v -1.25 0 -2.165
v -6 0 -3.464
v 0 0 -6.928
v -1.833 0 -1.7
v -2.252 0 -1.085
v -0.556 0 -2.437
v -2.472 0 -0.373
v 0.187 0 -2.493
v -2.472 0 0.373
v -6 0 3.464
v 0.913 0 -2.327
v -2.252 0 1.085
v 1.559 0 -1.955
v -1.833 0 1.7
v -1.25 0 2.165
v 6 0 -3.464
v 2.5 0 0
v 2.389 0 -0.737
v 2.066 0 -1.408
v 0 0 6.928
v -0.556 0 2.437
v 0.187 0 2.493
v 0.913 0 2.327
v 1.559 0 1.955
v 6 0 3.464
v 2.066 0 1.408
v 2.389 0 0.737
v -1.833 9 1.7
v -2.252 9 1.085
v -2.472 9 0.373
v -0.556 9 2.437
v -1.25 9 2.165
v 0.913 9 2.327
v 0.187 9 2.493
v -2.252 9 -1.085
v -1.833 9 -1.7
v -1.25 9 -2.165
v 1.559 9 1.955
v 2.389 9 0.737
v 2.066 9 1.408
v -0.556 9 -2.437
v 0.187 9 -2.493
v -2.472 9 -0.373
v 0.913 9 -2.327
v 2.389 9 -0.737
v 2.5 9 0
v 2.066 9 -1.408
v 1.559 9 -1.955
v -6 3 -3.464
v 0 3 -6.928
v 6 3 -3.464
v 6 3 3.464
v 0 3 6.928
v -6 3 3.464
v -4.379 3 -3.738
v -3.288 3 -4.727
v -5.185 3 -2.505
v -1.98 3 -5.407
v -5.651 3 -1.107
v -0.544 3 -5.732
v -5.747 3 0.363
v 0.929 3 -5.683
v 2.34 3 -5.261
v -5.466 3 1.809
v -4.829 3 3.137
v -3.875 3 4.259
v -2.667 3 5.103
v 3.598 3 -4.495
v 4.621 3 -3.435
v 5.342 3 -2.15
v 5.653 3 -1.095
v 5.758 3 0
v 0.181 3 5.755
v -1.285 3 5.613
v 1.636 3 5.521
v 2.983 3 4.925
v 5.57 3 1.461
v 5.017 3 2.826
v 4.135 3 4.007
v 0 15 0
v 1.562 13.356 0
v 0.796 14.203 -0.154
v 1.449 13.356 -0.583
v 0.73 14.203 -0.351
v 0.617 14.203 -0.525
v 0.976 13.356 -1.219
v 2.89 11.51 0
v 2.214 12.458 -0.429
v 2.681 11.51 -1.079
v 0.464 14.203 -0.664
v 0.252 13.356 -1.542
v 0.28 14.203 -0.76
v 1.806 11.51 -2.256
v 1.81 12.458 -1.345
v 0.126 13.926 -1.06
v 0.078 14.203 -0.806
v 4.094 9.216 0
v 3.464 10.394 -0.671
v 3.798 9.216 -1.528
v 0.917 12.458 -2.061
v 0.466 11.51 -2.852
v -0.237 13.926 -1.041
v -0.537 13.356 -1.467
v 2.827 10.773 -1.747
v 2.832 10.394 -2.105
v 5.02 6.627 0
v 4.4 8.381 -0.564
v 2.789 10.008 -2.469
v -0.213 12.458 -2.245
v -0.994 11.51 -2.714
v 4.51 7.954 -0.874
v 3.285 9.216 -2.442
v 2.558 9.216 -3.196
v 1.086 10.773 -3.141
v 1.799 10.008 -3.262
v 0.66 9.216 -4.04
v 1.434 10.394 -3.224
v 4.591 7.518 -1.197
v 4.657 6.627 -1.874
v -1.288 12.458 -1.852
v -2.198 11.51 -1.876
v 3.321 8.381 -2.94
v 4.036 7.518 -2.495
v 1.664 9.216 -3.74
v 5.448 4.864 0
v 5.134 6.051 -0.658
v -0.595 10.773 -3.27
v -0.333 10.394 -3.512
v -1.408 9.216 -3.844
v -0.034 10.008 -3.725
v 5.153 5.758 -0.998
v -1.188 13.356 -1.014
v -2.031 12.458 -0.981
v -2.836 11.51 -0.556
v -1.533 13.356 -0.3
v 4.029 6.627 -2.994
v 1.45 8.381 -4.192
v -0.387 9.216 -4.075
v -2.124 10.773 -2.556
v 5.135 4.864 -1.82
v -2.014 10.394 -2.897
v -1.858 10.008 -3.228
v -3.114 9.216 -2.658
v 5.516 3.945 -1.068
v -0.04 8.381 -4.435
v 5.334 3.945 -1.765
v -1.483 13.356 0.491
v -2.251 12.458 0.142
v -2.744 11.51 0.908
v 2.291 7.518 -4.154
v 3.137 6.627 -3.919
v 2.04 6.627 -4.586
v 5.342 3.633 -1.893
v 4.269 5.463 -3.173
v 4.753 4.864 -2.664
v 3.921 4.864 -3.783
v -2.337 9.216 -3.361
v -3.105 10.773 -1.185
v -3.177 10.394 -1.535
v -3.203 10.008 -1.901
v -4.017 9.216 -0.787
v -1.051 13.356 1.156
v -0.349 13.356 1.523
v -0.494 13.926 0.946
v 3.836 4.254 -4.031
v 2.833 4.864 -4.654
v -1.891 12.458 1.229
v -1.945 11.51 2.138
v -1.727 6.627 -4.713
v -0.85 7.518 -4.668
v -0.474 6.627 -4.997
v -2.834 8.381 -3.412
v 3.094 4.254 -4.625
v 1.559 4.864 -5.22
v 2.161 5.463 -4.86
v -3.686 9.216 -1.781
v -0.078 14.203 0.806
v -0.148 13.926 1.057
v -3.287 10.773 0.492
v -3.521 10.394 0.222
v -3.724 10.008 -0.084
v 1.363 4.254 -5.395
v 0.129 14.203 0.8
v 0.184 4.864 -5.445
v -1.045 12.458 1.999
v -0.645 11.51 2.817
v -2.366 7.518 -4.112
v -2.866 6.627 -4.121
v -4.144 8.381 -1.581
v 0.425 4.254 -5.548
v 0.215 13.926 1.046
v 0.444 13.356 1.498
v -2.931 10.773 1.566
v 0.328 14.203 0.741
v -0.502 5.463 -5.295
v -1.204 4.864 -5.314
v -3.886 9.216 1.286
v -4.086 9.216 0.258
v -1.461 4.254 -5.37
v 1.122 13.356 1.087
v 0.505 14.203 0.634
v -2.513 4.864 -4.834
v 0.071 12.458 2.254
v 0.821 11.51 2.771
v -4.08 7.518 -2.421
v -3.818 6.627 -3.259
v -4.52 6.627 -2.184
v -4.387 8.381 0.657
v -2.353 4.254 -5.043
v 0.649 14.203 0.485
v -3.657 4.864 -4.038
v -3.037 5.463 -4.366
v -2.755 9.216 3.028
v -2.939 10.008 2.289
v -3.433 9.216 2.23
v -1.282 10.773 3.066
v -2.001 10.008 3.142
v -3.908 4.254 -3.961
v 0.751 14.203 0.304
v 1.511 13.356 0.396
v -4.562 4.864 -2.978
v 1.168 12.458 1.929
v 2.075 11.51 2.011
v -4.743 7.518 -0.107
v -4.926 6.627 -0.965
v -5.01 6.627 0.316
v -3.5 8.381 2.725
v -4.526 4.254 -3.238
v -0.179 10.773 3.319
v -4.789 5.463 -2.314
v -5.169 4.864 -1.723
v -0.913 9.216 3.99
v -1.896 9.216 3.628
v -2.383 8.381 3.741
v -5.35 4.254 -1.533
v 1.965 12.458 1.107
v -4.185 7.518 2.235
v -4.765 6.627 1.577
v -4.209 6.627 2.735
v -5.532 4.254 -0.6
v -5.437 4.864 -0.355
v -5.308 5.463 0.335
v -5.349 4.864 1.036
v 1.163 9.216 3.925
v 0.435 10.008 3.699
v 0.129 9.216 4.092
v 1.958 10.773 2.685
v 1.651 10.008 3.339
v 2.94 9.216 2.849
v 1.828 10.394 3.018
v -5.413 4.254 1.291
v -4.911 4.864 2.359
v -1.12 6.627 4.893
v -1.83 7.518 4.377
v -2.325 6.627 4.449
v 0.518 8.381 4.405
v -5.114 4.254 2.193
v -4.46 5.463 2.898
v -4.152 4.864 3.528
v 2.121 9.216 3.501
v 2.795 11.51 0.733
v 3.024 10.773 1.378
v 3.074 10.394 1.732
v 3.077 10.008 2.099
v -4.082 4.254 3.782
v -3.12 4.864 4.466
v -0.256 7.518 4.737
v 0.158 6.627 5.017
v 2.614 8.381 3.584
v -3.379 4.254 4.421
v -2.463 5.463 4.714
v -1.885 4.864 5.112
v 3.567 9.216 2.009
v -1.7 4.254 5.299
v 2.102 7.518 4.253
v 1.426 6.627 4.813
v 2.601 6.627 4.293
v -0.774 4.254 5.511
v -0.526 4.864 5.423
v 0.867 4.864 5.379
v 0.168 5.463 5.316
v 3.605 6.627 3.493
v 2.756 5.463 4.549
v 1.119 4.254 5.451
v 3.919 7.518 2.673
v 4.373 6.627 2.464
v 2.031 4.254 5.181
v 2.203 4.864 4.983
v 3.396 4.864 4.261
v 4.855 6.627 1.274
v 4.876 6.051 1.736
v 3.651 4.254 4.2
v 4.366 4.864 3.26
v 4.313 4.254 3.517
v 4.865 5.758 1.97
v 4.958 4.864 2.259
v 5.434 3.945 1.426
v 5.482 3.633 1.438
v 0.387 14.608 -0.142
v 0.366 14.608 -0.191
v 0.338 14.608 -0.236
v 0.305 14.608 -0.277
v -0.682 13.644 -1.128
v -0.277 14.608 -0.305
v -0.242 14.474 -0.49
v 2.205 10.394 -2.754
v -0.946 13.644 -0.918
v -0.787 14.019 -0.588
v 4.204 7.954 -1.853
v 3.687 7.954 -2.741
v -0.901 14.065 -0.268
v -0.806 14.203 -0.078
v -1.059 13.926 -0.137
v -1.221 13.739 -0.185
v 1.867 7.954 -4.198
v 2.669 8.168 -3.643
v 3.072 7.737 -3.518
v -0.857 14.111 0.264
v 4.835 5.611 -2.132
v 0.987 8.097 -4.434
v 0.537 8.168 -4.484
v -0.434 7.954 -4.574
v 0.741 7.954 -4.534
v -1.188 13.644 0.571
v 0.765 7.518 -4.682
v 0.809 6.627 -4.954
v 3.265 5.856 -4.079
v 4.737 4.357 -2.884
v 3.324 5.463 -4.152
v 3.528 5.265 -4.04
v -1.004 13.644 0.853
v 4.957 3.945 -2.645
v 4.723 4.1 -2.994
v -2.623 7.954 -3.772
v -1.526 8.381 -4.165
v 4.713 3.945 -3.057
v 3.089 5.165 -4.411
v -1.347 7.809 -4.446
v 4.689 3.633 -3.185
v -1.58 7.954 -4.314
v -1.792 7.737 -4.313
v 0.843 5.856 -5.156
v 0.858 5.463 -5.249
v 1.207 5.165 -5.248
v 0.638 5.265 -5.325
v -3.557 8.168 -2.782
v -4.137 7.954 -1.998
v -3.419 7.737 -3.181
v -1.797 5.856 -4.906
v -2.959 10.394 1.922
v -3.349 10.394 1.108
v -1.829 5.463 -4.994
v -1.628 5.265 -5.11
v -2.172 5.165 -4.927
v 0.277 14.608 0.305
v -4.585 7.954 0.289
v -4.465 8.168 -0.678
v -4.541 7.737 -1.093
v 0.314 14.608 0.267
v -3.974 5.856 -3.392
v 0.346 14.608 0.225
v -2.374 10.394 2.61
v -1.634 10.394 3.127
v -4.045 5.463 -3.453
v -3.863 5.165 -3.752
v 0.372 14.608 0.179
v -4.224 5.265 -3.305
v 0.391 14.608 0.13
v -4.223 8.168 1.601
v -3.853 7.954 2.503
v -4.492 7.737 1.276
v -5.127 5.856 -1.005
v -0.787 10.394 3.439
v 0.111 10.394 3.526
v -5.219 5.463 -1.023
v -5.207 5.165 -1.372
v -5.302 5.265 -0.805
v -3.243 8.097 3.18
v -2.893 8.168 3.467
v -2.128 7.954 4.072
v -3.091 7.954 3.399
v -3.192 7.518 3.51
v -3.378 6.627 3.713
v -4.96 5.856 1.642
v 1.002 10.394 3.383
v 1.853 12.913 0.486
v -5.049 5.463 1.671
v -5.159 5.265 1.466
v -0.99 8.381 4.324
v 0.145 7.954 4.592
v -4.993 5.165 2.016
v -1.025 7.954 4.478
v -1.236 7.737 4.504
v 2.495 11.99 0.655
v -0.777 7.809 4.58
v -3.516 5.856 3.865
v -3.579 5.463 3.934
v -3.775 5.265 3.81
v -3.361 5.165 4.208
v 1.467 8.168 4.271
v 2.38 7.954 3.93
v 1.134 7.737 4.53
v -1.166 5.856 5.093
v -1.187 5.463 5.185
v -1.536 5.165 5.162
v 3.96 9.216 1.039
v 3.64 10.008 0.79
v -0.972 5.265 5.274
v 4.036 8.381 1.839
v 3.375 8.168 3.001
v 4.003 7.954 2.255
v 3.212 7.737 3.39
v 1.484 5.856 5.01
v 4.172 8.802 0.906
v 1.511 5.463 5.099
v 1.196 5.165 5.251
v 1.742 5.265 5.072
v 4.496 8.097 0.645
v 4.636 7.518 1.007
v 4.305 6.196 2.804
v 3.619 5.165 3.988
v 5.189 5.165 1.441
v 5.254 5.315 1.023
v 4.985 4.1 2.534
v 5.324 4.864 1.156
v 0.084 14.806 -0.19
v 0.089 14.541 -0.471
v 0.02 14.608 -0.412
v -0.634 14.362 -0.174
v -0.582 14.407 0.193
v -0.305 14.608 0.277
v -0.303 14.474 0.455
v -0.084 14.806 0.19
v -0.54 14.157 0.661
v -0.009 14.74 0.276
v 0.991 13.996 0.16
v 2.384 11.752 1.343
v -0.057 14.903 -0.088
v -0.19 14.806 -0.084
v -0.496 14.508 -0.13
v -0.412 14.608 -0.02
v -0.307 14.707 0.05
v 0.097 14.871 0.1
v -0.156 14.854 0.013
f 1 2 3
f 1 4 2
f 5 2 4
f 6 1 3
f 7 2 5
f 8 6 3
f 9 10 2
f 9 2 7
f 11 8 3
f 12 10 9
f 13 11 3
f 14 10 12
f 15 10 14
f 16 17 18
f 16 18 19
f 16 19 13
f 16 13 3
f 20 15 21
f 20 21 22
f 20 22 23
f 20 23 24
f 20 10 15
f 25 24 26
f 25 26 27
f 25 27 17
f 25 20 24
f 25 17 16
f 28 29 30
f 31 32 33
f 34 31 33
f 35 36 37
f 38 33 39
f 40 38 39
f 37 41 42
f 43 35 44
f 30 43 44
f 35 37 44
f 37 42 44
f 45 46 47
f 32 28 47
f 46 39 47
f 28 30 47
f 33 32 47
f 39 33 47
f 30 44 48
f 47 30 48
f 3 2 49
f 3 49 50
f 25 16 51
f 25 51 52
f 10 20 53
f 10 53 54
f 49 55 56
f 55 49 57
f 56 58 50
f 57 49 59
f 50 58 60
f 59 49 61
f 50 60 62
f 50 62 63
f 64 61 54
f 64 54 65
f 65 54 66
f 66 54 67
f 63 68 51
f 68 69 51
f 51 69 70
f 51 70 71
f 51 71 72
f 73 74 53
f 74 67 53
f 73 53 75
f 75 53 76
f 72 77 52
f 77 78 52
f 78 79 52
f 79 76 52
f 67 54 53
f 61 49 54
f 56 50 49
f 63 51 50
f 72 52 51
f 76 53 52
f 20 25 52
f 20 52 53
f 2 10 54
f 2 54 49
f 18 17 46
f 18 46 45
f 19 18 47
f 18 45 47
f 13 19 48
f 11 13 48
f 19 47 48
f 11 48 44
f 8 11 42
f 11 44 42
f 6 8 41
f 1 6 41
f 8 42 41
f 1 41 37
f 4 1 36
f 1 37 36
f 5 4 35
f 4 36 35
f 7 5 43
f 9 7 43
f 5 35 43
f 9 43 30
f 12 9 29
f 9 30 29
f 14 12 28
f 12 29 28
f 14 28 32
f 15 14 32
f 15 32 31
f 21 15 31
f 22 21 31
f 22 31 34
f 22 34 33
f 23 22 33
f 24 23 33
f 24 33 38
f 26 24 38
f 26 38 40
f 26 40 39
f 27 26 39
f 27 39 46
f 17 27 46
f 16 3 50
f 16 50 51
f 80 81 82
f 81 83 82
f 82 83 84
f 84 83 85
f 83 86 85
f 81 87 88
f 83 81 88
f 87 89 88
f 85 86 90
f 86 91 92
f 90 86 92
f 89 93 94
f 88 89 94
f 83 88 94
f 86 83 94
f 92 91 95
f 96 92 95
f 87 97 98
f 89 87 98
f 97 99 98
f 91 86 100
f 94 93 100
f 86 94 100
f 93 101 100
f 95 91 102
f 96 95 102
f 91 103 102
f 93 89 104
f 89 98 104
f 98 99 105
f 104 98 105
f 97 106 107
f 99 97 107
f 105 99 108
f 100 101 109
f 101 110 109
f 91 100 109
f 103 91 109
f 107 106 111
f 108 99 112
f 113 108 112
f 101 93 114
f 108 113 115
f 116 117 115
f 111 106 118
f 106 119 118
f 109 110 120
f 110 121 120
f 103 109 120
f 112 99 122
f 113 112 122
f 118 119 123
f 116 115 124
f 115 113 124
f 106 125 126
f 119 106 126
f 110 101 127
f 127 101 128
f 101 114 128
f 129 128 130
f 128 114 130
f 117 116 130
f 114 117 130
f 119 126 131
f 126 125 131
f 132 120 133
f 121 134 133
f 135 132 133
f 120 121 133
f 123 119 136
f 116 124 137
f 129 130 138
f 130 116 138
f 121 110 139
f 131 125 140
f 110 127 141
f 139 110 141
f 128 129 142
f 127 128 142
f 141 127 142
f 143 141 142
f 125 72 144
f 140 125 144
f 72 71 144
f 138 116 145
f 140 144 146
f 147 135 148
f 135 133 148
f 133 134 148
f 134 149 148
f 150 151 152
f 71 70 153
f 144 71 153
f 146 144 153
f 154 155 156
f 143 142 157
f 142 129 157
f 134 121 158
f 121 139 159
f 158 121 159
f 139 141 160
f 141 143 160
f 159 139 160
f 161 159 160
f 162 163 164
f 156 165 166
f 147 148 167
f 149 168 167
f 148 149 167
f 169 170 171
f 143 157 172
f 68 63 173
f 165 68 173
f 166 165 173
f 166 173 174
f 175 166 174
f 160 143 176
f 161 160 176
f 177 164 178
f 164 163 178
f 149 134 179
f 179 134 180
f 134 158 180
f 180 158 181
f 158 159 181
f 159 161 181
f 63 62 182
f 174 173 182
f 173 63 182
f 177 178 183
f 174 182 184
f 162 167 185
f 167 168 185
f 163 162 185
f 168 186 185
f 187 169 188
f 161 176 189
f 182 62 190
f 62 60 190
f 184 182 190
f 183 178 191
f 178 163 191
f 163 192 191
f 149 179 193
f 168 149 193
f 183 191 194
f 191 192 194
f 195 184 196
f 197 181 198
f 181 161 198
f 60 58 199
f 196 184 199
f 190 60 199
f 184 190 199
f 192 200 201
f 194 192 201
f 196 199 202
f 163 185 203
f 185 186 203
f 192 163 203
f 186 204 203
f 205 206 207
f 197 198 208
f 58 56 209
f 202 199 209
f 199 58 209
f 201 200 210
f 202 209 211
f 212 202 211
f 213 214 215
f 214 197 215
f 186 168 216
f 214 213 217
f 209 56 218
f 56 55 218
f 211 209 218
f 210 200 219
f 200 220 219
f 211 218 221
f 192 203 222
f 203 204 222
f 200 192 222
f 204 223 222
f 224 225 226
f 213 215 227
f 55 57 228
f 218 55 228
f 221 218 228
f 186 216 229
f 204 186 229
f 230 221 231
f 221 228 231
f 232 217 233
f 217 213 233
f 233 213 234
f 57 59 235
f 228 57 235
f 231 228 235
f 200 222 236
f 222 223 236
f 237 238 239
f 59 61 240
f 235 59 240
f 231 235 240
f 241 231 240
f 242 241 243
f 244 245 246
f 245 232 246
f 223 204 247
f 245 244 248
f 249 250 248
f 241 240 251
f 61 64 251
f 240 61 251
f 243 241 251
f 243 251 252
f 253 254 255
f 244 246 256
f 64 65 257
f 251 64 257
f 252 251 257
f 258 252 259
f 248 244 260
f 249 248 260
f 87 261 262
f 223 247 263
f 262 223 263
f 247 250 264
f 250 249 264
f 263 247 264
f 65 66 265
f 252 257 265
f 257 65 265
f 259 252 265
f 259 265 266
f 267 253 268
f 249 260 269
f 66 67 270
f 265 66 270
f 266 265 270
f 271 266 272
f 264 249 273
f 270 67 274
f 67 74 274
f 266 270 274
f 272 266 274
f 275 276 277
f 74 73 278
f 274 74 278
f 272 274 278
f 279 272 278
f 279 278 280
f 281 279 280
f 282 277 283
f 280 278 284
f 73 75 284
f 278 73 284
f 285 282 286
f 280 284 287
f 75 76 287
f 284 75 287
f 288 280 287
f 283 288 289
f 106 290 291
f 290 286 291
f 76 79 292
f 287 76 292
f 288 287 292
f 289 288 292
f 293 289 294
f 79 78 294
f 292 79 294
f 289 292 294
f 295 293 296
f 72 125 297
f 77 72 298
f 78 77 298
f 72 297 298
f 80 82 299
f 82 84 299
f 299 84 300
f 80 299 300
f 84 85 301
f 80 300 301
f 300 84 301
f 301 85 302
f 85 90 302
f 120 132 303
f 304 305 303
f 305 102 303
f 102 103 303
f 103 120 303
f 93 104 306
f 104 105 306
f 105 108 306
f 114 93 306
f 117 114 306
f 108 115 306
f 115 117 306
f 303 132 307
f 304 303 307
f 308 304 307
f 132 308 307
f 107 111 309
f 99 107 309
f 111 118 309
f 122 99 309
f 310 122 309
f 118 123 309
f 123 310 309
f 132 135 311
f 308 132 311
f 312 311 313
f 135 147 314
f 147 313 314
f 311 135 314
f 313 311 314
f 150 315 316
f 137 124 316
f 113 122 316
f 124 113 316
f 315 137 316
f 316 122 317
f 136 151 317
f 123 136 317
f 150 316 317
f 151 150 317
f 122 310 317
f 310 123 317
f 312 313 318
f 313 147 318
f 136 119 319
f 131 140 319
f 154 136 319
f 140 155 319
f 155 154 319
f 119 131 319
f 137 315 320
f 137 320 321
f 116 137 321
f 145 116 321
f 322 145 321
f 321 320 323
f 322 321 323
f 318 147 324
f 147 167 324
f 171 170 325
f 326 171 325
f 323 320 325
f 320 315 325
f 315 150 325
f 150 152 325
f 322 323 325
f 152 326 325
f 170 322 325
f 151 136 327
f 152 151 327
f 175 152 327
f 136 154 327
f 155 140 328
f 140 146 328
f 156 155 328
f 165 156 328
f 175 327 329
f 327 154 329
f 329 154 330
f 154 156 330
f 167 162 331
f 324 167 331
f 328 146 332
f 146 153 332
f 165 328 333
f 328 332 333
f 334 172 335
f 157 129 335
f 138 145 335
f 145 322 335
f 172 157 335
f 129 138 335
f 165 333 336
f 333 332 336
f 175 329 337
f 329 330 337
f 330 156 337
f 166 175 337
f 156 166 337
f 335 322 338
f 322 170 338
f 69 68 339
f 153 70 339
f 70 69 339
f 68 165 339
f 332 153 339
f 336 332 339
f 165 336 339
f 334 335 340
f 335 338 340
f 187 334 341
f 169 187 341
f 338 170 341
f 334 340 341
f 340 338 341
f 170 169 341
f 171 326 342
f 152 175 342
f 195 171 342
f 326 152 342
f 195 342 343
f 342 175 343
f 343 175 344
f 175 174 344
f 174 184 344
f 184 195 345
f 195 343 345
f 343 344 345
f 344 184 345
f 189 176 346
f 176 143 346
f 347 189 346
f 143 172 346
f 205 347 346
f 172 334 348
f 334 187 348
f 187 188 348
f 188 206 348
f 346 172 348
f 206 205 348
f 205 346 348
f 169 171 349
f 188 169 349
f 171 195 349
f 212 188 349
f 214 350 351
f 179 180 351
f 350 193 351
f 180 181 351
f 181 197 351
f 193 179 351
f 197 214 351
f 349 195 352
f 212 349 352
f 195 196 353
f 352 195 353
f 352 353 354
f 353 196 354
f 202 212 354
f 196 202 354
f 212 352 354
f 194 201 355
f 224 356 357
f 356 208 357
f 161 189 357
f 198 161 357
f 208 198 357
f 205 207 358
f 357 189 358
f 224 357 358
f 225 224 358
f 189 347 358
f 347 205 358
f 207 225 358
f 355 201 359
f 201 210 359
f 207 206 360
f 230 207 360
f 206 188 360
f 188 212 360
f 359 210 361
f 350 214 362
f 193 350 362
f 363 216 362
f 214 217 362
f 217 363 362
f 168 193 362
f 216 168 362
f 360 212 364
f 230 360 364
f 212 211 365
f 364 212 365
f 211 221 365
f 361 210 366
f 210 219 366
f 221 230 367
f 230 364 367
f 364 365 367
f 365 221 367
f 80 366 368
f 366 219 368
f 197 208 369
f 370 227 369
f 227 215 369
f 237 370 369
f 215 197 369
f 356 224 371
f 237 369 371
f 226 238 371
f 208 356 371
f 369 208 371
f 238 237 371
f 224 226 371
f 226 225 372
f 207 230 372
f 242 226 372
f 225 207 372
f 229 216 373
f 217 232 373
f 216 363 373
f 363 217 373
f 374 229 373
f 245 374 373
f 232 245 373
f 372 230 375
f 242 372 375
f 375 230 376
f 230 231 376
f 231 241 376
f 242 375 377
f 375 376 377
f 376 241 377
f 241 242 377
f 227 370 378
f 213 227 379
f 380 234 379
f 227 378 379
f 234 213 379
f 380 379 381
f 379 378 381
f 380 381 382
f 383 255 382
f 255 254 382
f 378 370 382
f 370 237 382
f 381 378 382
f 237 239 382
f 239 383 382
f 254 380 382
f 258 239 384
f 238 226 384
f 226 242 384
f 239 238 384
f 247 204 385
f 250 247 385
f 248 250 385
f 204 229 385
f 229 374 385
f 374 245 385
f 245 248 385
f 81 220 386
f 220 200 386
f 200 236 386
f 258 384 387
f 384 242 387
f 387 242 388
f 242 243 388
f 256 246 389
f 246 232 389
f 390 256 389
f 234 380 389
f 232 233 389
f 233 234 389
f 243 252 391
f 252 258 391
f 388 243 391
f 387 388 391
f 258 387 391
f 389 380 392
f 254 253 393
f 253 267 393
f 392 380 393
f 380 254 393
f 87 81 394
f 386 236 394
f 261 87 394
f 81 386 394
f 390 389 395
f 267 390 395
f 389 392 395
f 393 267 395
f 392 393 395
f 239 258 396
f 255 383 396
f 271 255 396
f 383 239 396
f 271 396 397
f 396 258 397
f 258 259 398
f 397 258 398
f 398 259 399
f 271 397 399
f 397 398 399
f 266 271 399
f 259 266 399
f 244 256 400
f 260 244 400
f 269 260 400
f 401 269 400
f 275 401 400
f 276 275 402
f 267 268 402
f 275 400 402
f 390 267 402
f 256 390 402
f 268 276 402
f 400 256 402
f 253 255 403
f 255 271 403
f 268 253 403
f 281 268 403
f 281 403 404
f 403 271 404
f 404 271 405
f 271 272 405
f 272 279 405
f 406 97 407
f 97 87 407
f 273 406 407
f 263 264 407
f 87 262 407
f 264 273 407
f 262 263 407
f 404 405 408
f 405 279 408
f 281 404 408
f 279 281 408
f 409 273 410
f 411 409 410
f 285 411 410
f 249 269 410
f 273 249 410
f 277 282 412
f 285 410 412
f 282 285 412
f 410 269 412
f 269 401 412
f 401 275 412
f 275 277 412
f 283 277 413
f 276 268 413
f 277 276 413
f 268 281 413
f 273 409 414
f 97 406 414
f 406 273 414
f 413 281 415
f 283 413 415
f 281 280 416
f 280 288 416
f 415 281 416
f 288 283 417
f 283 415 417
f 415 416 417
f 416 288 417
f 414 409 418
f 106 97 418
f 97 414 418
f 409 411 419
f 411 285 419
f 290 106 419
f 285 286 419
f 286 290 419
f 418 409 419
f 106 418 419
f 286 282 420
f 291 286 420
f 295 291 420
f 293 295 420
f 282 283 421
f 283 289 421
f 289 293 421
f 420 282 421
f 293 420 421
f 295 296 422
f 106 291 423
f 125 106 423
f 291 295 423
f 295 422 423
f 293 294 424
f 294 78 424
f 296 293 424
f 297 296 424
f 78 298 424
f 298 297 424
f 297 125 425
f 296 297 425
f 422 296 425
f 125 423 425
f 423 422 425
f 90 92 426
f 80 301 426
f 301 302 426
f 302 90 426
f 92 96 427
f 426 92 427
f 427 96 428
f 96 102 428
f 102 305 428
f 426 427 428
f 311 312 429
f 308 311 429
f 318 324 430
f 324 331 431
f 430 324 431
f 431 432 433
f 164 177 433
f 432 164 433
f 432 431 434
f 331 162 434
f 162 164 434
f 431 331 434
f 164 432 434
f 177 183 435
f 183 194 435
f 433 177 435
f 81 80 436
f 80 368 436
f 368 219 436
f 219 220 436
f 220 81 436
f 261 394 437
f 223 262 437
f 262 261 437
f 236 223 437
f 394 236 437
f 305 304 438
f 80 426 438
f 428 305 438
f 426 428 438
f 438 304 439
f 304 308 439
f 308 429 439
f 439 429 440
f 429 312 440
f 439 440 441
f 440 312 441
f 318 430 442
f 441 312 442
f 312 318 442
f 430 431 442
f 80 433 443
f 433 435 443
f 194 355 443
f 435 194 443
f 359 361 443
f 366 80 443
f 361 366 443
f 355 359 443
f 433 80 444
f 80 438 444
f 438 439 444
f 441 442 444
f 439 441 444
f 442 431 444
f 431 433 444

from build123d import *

# Parameters (mm, degrees)
EXTRUDE_1_DEPTH = 3
M6X1_01_D       = 5
M6X1_01_DEPTH   = 9


with BuildPart() as part:
    # Эскиз1 → Повернуть1 (revolve)
    with BuildSketch(Plane.XY):
        with BuildLine():
            Line((0, 0), (0, 15))
            add(Edge.make_bspline(
                [(0, 15), (5.663028189, 9.794830304), (6, 0)],
                knots=[0, 0, 0, 1, 1, 1], degree=2))
            Line((6, 0), (0, 0))
        make_face()
    revolve(axis=Axis((0, 0, 0), (0, 1, 0)))

    # Эскиз2 → Бобышка-Вытянуть1 (add)
    with BuildSketch(Plane.XZ):
        Polygon((0, 6.92820323), (-6, 3.464101615), (-6, -3.464101615), (0, -6.92820323), (6, -3.464101615), (6, 3.464101615), align=None)
    extrude(amount=-EXTRUDE_1_DEPTH)

    # Отверстие обработанное метчиком M6x1.01
    with Locations(Plane(origin=(0, 0, 0), x_dir=(-1, 0, 0), z_dir=(0, -1, 0))):
        with Locations((0, 0)):
            Hole(M6X1_01_D / 2, depth=M6X1_01_DEPTH)


solid = part.part
